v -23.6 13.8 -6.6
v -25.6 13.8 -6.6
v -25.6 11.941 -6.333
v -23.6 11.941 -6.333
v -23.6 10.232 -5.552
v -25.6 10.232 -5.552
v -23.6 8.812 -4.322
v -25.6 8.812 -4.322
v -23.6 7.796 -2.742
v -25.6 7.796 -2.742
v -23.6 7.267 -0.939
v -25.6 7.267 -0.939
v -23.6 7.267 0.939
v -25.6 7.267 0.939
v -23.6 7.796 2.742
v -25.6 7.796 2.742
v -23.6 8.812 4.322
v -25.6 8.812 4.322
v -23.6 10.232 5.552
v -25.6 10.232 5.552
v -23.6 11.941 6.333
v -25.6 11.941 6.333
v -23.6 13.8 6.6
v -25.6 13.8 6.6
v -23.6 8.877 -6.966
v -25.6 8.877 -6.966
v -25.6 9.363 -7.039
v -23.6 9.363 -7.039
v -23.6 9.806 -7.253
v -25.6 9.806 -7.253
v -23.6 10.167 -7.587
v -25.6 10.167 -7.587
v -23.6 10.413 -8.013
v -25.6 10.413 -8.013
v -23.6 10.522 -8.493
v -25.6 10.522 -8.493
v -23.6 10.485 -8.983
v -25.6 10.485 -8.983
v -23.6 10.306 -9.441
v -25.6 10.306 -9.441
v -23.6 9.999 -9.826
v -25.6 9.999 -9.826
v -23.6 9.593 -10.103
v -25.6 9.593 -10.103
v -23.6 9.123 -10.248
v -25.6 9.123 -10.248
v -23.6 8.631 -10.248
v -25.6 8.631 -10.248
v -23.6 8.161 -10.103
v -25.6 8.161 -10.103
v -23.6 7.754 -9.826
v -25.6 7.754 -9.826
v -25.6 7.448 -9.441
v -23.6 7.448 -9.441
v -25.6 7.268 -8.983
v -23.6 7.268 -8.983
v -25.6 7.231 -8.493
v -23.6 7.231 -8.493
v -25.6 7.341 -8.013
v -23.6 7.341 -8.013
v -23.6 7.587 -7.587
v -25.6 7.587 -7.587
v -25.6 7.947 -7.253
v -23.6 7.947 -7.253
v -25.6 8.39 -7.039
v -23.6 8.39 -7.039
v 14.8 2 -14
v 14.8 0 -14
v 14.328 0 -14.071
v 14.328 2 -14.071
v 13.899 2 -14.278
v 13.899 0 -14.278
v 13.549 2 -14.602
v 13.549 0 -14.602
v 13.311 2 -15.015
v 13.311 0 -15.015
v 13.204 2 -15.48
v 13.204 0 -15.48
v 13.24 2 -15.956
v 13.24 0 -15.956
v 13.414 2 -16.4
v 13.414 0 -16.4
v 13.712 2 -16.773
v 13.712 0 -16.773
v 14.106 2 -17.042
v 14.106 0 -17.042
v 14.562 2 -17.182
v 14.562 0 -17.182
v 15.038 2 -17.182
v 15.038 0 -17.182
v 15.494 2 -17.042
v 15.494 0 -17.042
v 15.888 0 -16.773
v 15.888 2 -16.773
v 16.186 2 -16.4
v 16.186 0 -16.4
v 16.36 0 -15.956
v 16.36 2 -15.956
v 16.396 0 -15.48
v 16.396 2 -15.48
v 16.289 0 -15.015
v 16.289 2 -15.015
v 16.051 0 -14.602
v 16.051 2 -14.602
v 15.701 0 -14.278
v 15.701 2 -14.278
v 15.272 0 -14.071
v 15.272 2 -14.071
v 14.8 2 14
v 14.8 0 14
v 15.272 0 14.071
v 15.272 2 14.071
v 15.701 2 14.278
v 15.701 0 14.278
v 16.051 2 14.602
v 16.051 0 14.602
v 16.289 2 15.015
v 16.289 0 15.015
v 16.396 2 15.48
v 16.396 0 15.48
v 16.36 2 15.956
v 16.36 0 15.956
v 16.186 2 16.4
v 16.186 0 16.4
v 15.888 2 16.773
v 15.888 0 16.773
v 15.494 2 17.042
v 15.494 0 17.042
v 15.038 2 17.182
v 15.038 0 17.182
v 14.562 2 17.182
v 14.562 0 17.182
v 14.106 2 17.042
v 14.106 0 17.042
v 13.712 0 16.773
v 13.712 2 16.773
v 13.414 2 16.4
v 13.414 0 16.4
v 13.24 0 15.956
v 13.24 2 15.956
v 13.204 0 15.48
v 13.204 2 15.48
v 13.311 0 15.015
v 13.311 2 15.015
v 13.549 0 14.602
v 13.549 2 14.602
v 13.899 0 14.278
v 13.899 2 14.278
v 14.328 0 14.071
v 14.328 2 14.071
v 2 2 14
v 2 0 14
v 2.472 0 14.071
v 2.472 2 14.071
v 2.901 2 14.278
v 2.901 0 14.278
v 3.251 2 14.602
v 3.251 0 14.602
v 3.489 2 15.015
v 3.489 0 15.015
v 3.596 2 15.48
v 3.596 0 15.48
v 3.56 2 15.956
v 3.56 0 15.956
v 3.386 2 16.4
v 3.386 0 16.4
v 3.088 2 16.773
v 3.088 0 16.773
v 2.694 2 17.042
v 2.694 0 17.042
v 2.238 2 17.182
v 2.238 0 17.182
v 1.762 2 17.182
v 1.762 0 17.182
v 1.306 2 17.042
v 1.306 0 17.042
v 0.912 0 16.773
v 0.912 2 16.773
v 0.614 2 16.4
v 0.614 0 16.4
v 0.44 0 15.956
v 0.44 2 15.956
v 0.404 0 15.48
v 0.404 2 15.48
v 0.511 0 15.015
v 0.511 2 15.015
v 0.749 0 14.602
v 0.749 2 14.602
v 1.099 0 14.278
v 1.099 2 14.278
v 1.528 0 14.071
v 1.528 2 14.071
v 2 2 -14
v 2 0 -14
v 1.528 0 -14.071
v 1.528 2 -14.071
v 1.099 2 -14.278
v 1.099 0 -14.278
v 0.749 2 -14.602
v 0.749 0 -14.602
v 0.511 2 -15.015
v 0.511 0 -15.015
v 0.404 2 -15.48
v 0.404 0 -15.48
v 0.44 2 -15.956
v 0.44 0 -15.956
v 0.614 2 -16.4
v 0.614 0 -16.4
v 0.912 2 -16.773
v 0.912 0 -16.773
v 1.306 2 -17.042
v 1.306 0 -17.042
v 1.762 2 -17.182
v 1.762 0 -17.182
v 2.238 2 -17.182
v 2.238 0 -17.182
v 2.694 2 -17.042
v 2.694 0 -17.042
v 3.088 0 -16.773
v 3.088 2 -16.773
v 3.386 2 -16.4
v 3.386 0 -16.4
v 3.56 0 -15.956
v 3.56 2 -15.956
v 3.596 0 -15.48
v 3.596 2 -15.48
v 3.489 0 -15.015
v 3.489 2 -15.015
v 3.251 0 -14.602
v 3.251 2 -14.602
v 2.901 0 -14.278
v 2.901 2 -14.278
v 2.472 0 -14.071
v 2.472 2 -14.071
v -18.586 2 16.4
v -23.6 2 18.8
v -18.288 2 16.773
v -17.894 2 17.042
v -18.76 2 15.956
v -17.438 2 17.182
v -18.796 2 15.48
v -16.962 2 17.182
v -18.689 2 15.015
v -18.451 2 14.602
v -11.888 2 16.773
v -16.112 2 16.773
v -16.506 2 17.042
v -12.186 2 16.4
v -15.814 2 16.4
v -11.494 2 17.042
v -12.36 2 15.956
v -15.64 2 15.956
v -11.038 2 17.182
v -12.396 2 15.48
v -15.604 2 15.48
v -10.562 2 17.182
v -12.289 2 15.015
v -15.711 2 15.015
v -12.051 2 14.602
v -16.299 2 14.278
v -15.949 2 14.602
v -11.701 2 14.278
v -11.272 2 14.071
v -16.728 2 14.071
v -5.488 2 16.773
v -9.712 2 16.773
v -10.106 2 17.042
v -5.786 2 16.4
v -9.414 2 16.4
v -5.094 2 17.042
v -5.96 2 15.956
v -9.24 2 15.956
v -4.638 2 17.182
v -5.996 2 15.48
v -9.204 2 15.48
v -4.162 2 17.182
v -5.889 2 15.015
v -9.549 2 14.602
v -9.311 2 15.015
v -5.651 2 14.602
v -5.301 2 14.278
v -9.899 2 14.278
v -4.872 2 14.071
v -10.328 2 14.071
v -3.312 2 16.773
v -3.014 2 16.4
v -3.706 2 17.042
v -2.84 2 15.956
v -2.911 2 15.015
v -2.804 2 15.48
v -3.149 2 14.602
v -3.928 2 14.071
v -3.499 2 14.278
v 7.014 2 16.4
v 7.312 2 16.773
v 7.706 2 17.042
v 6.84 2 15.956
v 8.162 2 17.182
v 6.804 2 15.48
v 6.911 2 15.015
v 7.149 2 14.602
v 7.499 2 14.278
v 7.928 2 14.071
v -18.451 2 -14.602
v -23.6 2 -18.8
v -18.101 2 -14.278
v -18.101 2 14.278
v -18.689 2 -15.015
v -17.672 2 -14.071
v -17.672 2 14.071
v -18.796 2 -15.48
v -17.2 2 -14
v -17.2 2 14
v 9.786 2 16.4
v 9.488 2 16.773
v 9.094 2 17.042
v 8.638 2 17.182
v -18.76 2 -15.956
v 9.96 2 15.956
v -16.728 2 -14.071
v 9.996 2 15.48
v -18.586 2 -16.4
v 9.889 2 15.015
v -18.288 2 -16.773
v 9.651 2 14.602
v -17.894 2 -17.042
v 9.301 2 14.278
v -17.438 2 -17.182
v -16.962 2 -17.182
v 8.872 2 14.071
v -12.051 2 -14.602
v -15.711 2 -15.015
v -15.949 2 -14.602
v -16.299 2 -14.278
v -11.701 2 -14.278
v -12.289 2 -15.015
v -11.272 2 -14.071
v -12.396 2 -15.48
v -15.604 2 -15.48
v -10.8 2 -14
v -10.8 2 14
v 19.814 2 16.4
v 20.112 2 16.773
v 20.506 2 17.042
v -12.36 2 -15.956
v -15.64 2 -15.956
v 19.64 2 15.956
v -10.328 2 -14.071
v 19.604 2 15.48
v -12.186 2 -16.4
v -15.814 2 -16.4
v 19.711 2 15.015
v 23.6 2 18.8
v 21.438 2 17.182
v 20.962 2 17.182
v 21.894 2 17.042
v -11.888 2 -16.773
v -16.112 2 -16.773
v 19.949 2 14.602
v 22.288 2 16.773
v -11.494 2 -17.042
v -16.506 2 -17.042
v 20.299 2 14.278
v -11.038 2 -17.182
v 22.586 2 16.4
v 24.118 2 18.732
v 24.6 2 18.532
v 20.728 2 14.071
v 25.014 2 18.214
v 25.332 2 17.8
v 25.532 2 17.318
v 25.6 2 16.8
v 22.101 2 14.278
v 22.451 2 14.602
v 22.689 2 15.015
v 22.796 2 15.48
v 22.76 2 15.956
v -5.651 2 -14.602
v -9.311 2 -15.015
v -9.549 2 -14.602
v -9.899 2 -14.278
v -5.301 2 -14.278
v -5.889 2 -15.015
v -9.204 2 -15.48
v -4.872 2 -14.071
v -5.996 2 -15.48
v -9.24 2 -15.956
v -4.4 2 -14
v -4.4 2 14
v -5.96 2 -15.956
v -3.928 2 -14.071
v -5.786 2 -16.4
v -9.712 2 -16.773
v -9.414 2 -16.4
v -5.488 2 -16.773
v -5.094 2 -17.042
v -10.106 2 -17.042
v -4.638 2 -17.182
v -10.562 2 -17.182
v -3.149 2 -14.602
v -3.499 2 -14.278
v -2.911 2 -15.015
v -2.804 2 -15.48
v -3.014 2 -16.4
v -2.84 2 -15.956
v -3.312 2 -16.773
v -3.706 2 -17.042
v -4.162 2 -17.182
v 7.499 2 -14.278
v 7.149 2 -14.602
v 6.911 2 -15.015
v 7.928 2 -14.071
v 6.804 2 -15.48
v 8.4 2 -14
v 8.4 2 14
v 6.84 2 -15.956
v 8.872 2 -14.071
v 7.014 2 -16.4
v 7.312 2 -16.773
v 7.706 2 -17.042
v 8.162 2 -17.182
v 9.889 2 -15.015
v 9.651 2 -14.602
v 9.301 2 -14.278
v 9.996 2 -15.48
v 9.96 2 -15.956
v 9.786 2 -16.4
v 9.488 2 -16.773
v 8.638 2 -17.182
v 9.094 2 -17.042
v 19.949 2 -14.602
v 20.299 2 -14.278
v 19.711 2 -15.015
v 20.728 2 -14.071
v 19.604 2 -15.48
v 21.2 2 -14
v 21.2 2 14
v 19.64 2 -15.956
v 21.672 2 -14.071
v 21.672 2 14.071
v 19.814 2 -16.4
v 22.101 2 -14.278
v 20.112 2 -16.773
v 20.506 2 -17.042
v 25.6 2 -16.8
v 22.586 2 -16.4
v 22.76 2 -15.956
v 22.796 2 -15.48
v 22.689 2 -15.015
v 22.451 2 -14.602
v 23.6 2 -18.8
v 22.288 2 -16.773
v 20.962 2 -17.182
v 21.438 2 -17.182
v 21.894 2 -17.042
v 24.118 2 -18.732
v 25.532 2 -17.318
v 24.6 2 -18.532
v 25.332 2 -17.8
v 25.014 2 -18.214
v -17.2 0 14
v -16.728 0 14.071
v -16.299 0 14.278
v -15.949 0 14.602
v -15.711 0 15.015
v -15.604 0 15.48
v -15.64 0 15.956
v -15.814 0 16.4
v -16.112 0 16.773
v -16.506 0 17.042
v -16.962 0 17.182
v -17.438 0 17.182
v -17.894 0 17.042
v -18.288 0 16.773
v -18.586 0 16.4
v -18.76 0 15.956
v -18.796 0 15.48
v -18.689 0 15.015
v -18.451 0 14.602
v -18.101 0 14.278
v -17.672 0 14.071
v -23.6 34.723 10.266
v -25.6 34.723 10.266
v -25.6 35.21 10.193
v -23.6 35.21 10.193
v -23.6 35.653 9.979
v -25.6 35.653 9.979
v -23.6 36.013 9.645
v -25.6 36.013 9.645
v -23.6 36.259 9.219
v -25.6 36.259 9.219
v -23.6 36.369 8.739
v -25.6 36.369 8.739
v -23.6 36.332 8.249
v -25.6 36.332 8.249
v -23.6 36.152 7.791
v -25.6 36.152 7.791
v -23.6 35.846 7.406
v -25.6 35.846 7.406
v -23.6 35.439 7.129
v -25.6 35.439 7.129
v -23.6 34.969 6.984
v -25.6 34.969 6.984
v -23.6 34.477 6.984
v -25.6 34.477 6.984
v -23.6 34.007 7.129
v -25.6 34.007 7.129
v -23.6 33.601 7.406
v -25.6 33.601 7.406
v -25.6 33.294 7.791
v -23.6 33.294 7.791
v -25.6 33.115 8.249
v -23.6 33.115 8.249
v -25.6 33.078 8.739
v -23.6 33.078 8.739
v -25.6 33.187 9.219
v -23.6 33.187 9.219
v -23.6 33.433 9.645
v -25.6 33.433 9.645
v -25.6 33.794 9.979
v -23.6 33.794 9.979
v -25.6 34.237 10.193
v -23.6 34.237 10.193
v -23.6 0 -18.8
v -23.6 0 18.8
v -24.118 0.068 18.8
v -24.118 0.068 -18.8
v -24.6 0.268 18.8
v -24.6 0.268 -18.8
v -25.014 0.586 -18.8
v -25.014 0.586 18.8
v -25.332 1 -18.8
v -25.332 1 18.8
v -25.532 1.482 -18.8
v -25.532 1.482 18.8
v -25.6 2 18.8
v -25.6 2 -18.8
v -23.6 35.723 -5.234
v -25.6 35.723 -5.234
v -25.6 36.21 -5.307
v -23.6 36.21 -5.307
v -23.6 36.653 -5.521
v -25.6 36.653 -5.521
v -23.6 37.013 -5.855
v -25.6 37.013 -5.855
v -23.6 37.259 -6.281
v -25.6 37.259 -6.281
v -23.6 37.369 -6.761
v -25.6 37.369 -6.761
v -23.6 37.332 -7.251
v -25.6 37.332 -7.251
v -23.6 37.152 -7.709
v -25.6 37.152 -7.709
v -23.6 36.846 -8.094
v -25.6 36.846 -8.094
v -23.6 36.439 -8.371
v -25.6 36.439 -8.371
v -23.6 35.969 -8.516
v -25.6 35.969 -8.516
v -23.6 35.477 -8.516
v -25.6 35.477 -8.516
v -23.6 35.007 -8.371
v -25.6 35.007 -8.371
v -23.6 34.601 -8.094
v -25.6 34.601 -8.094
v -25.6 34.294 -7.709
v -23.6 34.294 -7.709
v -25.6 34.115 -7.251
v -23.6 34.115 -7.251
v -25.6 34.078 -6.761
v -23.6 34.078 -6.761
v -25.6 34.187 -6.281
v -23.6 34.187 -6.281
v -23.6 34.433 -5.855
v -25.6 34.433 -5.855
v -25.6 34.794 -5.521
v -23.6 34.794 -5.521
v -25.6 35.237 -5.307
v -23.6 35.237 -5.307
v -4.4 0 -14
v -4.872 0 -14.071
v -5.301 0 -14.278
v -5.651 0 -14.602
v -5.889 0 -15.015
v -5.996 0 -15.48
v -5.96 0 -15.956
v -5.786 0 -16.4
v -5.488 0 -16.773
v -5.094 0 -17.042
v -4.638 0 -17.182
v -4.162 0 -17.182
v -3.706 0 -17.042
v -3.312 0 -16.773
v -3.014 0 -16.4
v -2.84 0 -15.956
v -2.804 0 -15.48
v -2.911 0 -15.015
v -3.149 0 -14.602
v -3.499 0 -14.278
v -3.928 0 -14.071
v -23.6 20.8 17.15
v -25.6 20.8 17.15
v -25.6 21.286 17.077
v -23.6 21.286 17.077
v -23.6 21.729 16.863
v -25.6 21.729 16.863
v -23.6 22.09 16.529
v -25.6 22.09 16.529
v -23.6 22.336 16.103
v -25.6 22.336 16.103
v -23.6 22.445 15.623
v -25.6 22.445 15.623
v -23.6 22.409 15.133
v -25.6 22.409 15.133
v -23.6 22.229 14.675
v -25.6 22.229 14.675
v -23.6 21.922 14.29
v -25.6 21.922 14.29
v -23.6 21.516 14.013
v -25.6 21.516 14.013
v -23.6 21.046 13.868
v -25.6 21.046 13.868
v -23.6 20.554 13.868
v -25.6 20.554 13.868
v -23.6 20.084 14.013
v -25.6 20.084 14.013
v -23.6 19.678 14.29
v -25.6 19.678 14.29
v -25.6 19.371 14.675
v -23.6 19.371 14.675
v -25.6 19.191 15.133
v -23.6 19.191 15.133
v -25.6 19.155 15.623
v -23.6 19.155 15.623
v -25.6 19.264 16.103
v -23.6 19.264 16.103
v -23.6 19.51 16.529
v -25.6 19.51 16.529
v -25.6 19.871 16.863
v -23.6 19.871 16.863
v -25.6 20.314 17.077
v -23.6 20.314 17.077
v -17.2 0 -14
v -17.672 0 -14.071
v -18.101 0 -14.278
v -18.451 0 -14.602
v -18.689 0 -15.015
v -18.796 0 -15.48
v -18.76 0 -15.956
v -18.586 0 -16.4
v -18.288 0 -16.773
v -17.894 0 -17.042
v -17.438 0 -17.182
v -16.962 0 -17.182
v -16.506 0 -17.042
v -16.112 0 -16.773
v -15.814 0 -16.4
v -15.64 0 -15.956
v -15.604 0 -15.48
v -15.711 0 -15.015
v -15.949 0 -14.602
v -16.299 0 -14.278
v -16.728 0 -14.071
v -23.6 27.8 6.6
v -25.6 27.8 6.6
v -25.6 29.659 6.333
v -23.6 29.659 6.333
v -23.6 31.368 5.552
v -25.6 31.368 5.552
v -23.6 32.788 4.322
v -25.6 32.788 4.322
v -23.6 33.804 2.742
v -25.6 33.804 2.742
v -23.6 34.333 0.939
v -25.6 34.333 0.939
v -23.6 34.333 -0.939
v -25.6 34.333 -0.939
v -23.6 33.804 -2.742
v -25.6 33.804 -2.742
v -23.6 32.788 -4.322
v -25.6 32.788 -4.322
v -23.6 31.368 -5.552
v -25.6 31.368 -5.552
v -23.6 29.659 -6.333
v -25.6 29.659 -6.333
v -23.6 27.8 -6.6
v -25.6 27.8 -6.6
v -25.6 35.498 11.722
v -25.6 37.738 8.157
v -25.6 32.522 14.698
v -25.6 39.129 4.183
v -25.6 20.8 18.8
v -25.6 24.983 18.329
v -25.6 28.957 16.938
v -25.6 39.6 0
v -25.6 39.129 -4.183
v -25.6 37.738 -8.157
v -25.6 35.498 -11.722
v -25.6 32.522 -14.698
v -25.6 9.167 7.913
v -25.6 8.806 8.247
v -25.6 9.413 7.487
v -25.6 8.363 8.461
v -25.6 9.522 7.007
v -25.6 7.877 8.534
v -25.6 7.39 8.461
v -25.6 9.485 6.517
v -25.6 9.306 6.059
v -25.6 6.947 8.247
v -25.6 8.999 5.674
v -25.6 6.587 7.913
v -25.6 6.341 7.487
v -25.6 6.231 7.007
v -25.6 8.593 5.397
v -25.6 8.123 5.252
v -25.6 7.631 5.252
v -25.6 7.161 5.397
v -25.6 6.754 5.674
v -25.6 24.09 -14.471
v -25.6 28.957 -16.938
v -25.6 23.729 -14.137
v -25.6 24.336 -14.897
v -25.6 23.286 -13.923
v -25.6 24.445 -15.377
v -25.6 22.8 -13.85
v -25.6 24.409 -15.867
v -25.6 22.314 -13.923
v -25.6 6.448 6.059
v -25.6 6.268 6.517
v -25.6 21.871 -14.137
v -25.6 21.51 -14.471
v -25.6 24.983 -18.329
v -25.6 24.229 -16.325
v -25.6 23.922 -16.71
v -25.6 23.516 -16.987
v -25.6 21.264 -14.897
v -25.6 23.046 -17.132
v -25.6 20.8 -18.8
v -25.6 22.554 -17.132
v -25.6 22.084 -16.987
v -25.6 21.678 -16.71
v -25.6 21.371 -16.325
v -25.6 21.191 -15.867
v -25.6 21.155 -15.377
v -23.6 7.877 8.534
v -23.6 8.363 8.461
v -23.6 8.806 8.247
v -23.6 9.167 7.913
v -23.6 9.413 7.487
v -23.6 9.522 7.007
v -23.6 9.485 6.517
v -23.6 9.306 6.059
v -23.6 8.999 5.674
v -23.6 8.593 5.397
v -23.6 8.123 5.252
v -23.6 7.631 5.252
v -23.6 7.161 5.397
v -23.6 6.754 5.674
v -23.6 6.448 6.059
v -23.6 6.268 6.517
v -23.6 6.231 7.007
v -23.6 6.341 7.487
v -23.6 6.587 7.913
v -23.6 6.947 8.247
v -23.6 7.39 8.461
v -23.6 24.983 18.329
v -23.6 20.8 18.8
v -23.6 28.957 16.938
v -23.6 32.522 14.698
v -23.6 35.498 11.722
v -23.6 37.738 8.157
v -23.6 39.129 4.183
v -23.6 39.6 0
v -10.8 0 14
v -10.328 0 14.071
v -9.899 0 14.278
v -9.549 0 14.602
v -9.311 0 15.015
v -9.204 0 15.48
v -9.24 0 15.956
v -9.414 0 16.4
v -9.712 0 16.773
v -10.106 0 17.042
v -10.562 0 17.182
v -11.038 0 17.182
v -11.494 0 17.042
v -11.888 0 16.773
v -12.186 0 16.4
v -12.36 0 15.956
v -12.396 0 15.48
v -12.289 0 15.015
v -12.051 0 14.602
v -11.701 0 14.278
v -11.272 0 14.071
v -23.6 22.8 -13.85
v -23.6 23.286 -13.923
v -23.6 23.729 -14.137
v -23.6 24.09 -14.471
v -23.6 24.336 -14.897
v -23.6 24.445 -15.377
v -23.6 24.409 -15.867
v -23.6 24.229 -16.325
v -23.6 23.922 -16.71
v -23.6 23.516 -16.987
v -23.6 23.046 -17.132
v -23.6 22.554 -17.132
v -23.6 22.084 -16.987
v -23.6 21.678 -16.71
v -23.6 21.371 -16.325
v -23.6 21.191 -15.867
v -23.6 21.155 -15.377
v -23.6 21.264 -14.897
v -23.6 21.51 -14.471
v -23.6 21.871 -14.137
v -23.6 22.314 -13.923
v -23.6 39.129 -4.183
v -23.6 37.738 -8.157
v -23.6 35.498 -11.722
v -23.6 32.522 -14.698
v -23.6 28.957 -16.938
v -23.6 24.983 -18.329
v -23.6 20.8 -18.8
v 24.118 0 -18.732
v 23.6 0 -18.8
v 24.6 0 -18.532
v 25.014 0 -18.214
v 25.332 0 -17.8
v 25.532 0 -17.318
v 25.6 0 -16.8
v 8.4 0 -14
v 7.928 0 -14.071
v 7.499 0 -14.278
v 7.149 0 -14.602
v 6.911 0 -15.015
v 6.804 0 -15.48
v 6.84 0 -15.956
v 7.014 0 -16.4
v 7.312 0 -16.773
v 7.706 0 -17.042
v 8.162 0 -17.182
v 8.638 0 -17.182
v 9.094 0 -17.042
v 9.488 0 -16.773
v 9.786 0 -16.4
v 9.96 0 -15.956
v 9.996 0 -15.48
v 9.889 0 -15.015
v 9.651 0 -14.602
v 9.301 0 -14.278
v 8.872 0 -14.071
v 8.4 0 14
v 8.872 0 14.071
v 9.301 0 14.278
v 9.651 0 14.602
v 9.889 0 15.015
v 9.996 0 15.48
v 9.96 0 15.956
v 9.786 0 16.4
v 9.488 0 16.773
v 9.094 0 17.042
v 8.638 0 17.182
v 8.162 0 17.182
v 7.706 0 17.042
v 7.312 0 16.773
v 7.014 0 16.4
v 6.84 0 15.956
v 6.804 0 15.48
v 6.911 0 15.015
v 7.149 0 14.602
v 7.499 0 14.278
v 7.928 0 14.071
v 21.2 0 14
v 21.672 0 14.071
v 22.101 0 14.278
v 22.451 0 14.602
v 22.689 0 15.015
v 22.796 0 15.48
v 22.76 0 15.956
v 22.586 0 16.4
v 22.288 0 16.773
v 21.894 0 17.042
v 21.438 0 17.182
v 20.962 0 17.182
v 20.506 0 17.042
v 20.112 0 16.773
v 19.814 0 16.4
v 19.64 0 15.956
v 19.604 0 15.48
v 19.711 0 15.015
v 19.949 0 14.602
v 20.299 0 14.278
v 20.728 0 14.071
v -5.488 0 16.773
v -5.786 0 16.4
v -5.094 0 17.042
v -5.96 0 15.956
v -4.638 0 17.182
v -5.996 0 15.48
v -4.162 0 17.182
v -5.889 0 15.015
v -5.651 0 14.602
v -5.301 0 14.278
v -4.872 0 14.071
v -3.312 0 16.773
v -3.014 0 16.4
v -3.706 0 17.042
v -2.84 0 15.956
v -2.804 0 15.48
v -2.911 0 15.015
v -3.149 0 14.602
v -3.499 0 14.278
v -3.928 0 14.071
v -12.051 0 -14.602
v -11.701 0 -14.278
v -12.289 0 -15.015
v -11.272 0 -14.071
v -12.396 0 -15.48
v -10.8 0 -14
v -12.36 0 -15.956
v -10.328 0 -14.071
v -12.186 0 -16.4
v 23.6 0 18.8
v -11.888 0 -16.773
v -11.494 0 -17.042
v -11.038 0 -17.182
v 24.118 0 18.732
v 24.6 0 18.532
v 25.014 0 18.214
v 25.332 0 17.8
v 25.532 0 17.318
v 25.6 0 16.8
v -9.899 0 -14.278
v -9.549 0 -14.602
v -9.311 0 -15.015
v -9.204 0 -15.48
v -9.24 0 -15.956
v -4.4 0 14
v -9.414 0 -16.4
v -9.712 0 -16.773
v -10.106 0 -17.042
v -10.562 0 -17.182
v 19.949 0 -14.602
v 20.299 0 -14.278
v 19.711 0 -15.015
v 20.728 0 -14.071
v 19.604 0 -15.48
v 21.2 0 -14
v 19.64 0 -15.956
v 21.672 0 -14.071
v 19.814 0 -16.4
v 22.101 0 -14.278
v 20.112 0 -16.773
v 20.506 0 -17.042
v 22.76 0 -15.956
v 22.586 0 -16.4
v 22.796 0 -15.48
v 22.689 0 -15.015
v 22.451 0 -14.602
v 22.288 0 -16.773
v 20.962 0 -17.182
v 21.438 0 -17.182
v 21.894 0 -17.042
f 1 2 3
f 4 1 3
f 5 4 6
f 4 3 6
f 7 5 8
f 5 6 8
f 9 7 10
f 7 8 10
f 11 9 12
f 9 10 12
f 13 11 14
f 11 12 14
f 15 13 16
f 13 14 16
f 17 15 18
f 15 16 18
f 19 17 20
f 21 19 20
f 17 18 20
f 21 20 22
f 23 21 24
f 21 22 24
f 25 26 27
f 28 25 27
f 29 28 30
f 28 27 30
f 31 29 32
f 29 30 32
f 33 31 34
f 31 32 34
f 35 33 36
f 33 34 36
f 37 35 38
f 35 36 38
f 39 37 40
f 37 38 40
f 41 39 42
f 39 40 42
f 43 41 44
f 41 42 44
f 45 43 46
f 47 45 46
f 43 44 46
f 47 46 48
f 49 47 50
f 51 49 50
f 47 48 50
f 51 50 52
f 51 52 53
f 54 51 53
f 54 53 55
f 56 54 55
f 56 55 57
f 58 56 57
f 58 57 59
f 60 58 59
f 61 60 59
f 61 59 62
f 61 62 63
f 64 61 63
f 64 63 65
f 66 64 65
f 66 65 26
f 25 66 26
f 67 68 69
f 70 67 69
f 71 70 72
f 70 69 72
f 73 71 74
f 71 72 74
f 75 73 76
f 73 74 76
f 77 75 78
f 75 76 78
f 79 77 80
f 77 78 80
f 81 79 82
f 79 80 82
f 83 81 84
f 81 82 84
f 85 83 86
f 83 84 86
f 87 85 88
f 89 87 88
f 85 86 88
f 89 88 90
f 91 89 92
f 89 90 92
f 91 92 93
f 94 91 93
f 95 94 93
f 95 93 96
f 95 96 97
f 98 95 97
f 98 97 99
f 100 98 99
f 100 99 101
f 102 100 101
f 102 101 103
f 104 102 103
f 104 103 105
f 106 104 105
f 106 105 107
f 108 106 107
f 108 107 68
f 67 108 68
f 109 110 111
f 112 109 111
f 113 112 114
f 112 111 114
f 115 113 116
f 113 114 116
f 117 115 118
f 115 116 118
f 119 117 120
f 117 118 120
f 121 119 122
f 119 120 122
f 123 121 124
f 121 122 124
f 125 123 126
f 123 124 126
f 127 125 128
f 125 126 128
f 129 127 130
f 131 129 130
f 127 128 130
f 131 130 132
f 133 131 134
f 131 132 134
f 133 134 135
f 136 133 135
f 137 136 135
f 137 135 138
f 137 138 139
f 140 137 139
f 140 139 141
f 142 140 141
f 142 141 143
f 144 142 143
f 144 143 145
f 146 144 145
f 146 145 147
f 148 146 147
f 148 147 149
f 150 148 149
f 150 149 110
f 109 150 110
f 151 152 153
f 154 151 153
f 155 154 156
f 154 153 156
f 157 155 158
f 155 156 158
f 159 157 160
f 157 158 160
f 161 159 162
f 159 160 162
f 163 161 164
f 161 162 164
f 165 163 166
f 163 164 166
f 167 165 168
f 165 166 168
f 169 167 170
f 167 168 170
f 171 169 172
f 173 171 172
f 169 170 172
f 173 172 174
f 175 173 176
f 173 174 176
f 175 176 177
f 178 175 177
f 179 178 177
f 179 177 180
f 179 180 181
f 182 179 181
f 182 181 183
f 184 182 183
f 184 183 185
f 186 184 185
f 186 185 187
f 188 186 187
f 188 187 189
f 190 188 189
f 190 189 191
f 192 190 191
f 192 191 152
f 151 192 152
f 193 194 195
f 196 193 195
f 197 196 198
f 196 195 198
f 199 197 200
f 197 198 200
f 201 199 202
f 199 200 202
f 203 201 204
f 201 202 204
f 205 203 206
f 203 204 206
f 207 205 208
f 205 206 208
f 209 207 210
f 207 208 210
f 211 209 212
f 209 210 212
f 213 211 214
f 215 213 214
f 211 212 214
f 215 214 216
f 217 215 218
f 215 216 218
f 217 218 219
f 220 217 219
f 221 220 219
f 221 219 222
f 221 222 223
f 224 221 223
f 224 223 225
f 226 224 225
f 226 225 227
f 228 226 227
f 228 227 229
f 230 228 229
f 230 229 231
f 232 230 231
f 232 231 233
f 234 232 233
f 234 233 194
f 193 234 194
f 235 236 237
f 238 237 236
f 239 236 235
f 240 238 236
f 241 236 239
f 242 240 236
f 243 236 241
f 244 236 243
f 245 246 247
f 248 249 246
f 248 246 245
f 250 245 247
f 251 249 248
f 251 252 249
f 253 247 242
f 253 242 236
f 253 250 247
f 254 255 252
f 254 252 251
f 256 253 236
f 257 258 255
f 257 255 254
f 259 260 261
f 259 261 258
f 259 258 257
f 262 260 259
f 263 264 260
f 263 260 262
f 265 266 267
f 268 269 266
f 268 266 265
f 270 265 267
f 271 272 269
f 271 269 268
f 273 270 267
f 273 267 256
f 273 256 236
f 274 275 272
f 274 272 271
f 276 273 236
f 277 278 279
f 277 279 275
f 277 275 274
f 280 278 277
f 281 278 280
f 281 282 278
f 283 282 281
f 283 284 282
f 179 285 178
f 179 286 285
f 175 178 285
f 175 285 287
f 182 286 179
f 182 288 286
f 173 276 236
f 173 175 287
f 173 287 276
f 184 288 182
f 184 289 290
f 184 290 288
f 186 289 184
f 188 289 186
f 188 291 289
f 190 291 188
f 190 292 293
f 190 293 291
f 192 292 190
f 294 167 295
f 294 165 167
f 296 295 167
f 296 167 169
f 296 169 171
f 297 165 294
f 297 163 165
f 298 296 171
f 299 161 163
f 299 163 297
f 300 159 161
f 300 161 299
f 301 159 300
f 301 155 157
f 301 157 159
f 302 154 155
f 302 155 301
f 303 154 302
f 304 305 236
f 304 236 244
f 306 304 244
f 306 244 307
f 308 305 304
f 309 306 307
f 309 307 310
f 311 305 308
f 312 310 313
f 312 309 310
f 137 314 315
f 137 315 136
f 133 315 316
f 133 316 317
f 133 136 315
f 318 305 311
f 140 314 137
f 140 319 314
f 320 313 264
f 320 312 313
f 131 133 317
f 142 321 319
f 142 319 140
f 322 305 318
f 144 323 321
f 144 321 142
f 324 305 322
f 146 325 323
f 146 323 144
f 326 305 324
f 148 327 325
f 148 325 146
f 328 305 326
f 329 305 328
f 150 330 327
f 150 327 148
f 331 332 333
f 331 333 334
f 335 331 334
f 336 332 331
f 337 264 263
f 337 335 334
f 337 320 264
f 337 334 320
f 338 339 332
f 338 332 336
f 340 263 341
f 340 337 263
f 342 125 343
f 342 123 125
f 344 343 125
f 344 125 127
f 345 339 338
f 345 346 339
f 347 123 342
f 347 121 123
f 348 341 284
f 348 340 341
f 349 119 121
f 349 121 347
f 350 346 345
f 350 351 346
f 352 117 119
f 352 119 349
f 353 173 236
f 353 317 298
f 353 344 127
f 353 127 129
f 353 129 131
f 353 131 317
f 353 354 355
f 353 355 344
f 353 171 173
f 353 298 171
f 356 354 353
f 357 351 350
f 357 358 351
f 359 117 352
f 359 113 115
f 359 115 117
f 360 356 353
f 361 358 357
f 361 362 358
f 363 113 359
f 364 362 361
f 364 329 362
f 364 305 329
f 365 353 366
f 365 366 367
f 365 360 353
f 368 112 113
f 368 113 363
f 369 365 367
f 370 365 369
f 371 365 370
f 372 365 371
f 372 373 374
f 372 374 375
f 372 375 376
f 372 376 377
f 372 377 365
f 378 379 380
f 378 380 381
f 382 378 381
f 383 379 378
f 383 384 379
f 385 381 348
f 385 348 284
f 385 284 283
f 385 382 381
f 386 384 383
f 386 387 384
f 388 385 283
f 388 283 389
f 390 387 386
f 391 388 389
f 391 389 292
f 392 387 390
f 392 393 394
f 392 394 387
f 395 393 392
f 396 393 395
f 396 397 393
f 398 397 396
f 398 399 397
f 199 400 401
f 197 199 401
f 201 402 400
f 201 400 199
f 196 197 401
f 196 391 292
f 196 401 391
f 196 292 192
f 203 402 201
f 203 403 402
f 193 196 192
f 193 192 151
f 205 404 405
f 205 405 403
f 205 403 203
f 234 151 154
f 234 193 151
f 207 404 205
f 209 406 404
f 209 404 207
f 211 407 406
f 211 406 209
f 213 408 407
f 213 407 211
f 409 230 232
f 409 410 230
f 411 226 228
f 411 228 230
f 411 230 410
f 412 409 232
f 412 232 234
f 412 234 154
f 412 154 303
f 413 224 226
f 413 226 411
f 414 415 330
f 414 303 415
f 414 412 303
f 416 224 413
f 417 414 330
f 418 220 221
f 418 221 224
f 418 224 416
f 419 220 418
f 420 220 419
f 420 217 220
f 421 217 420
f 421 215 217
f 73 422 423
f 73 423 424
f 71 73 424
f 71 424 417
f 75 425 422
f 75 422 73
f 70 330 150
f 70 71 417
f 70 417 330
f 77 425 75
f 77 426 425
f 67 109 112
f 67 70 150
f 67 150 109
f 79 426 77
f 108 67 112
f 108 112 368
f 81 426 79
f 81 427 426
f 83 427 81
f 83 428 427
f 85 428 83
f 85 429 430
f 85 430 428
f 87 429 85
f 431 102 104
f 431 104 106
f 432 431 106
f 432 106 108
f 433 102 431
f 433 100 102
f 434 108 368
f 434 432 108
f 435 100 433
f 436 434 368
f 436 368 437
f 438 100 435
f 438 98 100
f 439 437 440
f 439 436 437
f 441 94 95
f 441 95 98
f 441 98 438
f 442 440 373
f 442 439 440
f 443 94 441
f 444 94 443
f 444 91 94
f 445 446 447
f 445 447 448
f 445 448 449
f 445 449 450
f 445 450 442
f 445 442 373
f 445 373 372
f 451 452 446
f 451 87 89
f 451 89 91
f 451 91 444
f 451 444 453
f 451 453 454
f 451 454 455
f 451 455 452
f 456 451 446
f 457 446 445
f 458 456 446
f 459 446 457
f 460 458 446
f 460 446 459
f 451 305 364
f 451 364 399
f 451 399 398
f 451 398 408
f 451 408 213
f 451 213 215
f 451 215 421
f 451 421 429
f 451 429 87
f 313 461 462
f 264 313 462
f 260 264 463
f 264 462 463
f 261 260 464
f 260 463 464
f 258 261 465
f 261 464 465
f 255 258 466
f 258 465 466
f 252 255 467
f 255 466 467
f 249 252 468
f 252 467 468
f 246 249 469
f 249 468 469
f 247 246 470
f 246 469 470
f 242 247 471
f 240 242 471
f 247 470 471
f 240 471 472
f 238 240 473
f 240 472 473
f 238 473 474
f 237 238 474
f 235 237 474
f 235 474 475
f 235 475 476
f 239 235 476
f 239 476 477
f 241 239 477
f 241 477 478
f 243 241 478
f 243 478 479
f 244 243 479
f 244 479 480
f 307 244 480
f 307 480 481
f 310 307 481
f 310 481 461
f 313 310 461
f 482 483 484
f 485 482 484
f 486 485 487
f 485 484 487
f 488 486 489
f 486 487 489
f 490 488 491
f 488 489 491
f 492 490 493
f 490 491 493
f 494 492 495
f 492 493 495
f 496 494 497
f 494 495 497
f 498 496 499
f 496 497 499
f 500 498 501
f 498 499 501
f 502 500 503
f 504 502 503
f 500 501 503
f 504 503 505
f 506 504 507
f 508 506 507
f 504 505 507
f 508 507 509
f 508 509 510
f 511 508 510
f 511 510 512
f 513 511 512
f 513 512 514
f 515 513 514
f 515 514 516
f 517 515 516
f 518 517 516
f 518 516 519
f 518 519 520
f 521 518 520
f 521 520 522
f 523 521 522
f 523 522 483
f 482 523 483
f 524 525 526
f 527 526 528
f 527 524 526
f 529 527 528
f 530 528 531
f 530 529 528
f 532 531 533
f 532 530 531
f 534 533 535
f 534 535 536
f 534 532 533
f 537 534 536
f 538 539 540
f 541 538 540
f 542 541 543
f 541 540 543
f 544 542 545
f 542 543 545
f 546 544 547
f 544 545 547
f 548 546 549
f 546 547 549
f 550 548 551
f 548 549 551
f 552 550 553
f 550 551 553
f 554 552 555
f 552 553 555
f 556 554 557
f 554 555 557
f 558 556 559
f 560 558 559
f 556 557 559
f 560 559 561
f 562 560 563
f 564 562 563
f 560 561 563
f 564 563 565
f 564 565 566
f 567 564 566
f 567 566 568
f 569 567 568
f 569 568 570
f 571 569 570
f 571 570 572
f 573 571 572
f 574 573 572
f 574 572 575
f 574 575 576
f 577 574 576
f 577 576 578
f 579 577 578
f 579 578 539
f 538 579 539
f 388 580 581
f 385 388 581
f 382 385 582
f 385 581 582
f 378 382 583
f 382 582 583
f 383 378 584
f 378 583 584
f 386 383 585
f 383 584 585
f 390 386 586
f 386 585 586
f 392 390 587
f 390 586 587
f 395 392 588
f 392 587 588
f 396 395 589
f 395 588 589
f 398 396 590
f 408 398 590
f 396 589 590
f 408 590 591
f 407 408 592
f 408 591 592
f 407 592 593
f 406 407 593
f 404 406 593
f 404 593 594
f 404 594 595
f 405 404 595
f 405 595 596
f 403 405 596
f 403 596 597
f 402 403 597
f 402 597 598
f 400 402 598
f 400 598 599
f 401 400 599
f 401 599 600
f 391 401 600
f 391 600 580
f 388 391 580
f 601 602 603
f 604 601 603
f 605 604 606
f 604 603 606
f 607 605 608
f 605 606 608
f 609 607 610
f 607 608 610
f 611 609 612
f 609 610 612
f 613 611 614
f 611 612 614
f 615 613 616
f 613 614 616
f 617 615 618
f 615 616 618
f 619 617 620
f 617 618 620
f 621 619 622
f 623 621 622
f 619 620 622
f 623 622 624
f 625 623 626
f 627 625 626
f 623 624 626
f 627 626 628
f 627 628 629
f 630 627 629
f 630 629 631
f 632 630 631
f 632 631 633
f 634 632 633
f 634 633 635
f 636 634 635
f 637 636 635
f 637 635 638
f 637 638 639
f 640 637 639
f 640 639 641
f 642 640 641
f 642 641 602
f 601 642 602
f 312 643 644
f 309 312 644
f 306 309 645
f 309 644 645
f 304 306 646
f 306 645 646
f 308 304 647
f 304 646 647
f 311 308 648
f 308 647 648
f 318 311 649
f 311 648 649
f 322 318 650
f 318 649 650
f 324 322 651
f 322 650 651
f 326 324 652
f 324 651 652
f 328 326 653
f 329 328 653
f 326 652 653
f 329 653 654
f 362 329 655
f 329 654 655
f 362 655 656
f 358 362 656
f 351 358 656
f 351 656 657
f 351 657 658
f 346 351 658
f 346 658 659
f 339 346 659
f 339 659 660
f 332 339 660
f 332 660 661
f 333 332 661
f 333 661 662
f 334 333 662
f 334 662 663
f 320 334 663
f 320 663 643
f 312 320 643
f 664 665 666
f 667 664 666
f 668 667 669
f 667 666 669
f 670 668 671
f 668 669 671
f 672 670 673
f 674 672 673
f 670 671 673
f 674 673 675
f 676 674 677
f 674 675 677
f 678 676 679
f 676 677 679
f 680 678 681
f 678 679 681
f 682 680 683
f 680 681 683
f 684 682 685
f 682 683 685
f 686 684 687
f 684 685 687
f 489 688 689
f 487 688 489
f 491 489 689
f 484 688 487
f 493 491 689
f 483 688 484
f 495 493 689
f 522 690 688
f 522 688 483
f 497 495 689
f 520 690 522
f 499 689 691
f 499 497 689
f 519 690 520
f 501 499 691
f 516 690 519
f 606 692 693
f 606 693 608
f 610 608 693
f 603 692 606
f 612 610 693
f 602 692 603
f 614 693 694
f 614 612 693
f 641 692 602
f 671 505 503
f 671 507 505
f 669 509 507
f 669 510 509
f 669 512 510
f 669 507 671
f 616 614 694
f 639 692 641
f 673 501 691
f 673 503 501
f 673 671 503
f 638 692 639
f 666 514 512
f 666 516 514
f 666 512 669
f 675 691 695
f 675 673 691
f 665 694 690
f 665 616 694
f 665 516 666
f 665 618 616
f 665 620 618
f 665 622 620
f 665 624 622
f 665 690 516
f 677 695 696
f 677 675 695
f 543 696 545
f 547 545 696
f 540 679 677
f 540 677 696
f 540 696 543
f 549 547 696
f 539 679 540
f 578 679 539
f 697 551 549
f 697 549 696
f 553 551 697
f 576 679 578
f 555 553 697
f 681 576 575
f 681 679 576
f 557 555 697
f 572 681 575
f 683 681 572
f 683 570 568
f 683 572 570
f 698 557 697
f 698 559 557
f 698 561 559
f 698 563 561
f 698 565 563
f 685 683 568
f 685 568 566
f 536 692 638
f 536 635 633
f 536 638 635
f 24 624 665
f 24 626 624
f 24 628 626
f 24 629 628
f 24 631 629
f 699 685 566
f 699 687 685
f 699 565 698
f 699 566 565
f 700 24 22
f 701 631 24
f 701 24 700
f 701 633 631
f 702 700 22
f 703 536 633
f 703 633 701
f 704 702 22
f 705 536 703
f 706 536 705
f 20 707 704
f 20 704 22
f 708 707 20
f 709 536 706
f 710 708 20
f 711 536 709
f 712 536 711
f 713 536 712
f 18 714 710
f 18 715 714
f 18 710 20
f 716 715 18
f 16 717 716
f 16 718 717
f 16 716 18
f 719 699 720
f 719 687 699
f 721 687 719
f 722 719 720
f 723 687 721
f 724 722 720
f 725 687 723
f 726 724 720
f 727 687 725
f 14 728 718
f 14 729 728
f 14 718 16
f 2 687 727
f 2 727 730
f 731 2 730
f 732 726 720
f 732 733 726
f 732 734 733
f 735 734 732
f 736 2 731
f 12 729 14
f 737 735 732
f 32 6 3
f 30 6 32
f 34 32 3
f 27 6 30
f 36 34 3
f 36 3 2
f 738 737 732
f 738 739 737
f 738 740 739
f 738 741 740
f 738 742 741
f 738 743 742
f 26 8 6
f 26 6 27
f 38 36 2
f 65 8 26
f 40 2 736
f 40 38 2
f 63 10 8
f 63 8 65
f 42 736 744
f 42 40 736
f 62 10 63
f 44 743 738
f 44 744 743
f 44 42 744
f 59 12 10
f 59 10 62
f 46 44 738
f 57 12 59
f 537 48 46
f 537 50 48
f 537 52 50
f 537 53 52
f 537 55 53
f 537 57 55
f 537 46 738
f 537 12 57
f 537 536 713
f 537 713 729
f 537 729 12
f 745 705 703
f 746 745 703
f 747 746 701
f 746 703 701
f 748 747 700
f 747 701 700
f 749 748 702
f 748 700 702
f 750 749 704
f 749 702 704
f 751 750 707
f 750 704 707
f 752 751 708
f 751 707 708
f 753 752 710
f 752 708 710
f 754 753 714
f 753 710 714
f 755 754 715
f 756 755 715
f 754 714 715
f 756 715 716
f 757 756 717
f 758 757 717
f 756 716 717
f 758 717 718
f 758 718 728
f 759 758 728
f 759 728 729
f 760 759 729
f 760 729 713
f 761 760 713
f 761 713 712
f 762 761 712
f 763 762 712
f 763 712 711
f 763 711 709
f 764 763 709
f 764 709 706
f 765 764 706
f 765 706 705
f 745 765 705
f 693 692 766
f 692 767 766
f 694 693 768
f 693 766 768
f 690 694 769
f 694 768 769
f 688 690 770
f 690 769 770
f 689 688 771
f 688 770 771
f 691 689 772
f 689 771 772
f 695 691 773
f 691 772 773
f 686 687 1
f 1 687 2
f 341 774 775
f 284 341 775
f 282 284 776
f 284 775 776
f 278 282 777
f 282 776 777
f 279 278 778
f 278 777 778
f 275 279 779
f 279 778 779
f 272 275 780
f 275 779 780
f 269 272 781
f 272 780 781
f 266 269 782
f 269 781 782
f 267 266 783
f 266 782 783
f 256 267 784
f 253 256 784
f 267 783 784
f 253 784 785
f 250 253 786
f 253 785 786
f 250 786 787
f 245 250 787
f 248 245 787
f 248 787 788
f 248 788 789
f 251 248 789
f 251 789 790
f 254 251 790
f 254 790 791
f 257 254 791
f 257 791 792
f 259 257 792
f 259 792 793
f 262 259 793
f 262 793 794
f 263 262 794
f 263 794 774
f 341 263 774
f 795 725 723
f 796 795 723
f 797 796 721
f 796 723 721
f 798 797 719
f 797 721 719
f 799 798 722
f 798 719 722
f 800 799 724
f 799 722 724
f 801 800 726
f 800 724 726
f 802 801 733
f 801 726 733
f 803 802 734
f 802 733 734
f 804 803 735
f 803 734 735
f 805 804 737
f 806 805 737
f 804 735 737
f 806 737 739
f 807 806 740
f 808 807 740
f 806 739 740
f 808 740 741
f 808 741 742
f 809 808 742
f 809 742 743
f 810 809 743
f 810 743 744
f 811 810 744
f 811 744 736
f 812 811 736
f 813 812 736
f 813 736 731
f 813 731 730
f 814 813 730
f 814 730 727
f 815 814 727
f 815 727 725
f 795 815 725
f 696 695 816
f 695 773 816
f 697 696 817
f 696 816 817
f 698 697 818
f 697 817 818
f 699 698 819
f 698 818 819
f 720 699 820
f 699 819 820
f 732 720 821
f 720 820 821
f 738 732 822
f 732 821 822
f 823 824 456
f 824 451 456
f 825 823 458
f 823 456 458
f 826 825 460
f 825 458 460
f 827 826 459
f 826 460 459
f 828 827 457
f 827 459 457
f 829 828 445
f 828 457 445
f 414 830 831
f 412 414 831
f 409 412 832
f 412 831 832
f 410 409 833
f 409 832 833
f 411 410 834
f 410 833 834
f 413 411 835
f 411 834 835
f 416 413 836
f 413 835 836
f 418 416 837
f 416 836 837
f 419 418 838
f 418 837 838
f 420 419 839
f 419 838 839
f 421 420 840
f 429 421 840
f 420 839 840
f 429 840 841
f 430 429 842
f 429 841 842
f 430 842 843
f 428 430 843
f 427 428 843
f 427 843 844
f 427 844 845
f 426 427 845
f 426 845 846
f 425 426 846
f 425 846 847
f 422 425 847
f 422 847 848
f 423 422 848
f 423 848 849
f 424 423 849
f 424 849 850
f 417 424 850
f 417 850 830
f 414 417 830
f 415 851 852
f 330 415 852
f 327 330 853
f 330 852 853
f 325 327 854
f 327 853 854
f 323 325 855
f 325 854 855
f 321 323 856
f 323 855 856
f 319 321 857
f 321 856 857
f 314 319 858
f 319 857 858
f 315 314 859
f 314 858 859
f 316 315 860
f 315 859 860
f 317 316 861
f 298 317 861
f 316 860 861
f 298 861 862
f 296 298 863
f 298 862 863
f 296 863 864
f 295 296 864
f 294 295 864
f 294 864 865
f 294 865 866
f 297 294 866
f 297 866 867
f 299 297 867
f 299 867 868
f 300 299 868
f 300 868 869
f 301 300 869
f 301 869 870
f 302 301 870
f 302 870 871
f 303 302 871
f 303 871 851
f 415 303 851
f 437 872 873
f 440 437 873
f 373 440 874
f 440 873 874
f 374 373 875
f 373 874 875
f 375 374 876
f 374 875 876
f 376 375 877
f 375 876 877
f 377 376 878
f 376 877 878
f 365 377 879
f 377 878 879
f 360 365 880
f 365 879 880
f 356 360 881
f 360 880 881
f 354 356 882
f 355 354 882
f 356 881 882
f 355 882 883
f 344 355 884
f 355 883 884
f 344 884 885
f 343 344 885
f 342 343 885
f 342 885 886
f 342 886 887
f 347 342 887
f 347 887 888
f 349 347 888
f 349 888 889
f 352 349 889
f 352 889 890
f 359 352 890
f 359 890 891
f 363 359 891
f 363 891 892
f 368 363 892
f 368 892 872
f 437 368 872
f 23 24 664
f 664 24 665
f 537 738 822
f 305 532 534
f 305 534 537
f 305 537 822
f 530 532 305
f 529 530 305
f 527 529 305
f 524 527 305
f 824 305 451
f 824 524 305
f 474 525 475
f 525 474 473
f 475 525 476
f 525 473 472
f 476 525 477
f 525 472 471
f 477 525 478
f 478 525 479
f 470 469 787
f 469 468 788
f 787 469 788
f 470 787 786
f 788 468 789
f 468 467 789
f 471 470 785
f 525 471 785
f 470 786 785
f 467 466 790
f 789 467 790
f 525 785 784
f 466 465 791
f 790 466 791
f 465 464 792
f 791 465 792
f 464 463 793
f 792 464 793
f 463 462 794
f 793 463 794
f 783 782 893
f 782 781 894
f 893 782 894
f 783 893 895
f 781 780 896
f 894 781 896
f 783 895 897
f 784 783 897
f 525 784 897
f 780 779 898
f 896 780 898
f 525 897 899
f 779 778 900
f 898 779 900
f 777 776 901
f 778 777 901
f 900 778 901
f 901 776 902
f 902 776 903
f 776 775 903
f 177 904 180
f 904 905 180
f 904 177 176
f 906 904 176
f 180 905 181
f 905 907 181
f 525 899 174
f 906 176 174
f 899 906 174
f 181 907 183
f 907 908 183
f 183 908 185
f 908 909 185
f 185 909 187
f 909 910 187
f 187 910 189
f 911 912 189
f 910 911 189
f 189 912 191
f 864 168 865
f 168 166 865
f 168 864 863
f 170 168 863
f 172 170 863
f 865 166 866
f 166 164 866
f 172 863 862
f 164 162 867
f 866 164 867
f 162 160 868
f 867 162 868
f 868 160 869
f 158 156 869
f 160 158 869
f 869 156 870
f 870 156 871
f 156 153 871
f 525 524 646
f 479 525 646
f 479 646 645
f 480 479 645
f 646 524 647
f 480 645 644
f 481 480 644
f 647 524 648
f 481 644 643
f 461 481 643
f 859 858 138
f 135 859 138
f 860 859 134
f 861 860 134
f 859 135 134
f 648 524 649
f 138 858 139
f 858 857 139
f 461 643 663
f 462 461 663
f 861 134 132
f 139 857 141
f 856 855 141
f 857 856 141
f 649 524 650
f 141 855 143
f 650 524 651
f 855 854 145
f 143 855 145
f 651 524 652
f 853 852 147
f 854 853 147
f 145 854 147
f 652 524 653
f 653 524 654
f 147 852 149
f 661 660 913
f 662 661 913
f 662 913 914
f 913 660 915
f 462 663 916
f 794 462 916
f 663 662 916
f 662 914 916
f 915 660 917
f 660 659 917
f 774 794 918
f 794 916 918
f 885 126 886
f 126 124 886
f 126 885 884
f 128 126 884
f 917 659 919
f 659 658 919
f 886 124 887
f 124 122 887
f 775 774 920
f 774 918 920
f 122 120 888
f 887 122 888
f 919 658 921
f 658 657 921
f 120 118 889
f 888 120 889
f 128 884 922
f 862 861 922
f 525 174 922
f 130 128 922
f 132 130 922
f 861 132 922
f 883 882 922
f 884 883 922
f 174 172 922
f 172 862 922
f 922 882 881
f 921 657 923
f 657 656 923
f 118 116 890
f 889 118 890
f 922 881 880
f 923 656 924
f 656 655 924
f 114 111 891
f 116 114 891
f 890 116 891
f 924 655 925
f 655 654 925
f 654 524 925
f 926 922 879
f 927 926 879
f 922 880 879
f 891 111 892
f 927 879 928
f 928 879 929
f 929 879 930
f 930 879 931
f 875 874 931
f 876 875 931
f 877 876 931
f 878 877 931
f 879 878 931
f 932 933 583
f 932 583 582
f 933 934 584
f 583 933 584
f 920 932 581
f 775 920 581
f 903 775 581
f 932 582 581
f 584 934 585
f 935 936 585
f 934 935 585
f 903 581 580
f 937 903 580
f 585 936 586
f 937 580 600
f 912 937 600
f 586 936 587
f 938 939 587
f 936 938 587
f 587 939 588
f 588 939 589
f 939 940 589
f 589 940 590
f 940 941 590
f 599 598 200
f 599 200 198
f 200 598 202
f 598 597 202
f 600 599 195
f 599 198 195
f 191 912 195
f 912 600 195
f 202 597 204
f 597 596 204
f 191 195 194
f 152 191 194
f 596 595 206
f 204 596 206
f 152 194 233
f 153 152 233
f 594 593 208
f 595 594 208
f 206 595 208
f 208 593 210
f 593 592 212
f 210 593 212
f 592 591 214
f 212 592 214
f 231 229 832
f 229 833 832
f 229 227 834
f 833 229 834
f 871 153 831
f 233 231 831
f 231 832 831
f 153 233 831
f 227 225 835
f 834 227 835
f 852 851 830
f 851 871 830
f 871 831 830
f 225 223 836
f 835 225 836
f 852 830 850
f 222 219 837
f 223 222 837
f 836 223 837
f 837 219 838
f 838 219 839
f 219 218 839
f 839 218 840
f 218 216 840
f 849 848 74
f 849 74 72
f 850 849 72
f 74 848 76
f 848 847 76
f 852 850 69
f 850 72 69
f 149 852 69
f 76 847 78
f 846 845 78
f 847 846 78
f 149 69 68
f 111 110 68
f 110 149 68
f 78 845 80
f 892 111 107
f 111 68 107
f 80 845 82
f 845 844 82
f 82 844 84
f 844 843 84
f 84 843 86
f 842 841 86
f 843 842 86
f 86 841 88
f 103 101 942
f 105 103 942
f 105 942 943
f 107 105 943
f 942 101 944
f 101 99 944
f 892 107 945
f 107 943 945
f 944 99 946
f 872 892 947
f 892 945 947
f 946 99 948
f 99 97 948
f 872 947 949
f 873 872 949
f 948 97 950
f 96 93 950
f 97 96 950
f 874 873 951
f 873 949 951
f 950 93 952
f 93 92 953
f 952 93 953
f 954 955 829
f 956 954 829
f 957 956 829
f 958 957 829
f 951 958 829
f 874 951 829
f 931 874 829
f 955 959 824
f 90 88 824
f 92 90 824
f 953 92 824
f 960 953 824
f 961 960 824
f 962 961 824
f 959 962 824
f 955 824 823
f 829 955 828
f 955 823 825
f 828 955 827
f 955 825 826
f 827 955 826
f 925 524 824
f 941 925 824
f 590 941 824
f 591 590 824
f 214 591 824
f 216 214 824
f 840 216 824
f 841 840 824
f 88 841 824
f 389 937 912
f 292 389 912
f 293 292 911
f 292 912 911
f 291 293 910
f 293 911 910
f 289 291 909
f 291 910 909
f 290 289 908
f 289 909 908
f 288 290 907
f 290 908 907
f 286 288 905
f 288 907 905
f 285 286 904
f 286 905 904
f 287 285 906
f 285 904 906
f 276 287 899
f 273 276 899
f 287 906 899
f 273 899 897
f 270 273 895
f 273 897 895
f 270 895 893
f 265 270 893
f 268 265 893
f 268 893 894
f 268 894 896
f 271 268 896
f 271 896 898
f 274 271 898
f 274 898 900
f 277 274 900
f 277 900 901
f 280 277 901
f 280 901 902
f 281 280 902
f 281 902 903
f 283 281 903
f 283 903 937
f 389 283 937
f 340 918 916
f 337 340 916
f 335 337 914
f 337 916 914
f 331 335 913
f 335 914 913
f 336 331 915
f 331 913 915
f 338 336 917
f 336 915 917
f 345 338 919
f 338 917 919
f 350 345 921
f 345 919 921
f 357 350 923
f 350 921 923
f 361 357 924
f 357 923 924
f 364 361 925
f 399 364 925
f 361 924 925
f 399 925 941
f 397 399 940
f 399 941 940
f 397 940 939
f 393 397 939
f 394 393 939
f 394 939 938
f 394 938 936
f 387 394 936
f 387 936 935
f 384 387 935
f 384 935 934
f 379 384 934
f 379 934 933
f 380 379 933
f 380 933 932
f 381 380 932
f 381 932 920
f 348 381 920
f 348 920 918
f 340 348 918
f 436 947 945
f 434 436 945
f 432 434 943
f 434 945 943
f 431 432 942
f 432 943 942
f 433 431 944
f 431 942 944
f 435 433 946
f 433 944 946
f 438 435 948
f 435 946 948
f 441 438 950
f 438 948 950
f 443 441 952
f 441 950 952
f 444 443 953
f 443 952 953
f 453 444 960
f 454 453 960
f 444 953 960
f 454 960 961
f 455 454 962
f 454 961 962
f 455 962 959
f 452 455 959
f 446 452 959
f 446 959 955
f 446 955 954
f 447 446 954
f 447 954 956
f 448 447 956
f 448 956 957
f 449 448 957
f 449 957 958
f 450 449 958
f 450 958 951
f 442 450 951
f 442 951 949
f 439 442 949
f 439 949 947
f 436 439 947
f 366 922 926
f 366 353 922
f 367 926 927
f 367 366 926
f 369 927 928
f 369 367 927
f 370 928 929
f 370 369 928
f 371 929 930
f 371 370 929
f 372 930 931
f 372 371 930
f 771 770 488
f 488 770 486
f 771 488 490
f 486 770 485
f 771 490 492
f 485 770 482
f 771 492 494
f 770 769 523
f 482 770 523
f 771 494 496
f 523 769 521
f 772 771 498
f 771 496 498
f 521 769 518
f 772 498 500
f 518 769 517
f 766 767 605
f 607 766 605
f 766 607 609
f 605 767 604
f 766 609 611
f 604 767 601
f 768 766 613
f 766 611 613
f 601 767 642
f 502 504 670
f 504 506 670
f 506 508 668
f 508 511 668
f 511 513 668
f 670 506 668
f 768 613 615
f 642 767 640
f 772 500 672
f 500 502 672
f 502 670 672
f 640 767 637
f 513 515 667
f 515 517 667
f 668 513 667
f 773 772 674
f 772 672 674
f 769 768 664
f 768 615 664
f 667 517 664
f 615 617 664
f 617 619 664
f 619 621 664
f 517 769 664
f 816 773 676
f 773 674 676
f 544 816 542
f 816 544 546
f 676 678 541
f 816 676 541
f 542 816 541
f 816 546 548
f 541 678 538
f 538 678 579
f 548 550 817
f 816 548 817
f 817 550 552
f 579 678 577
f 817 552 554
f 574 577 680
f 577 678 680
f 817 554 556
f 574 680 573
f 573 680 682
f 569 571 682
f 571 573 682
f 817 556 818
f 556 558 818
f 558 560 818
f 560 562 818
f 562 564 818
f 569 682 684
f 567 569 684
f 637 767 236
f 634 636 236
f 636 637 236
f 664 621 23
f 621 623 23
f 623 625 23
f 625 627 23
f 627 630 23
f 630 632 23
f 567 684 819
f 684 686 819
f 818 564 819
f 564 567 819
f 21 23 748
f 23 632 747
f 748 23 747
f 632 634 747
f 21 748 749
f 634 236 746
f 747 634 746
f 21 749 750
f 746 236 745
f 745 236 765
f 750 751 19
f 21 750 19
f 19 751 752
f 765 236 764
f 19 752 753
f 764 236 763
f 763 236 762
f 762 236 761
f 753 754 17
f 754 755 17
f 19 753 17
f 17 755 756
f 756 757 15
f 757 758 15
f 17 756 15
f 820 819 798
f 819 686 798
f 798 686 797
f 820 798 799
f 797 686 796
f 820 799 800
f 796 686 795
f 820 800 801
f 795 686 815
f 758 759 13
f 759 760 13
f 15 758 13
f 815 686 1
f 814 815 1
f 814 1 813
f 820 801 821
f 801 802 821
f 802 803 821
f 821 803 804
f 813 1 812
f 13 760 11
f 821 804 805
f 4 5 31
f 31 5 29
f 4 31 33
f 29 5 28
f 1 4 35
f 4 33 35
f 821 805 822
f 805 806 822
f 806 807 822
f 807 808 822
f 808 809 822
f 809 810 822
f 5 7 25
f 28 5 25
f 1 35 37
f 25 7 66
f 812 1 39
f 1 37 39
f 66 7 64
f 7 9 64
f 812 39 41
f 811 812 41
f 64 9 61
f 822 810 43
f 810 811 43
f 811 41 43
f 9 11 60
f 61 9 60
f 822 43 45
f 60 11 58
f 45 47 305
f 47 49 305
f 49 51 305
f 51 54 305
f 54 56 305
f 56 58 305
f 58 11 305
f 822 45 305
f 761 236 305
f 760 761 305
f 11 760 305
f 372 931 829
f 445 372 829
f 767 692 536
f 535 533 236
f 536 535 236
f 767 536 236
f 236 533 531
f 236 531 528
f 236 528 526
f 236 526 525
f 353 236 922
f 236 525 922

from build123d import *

# Parameters (mm, degrees)
SKETCH1_W           = 51.2
SKETCH1_H           = 37.6
BOSS_EXTRUDE1_DEPTH = 2
SKETCH2_W           = 2
SKETCH2_H           = 37.6
BOSS_EXTRUDE2_DEPTH = 37.6
SKETCH3_R           = 1.65
CUT_EXTRUDE2_DEPTH  = 37.6
SKETCH5_R           = 6.6
CUT_EXTRUDE3_DEPTH  = 37.6
SKETCH6_R           = 1.6
CUT_EXTRUDE4_DEPTH  = 37.6
FILLET1_R           = 2
FILLET2_R           = 2
FILLET3_R           = 18.8


with BuildPart() as part:
    # Sketch1 → Boss-Extrude1 (new body)
    with BuildSketch(Plane(origin=(0, 0, 0), x_dir=(1, 0, 0), z_dir=(0, 1, 0))):
        Rectangle(SKETCH1_W, SKETCH1_H)
    extrude(amount=BOSS_EXTRUDE1_DEPTH)

    # Sketch2 → Boss-Extrude2 (add)
    with BuildSketch(Plane(origin=(0, 2, 0), x_dir=(1, 0, 0), z_dir=(0, 1, 0))):
        with Locations((-24.6, 0)):
            Rectangle(SKETCH2_W, SKETCH2_H)
    extrude(amount=BOSS_EXTRUDE2_DEPTH)

    # Sketch3 → Cut-Extrude2 (cut)
    with BuildSketch(Plane.ZY.offset(25.6)):
        with Locations((15.5, 20.8)):
            Circle(SKETCH3_R)
        with Locations((6.883974596, 7.876606241)):
            Circle(SKETCH3_R)
        with Locations((-8.616025404, 8.876606241)):
            Circle(SKETCH3_R)
        with Locations((-15.5, 22.8)):
            Circle(SKETCH3_R)
        with Locations((-6.883974596, 35.723393759)):
            Circle(SKETCH3_R)
        with Locations((8.616025404, 34.723393759)):
            Circle(SKETCH3_R)
    extrude(amount=-CUT_EXTRUDE2_DEPTH, mode=Mode.SUBTRACT)

    # Sketch5 → Cut-Extrude3 (cut)
    with BuildSketch(Plane.ZY.offset(25.6)):
        with Locations((0, 27.8)):
            Circle(SKETCH5_R)
        with BuildLine():
            Line((6.6, 13.8), (6.6, 27.8))
            ThreePointArc((6.6, 27.8), (0, 21.2), (-6.6, 27.8))
            Line((-6.6, 27.8), (-6.6, 13.8))
            ThreePointArc((-6.6, 13.8), (0, 20.4), (6.6, 13.8))
        make_face()
        with Locations((0, 13.8)):
            Circle(SKETCH5_R)
    extrude(amount=-CUT_EXTRUDE3_DEPTH, mode=Mode.SUBTRACT)

    # Sketch6 → Cut-Extrude4 (cut)
    with BuildSketch(Plane(origin=(0, 0, 0), x_dir=(-1, 0, 0), z_dir=(0, -1, 0))):
        with Locations(Location((17.2, -15.6, 0), (0, 0, 90))):
            Circle(SKETCH6_R)
        with Locations(Location((10.8, -15.6, 0), (0, 0, 90))):
            Circle(SKETCH6_R)
        with Locations(Location((4.4, -15.6, 0), (0, 0, 90))):
            Circle(SKETCH6_R)
        with Locations(Location((-2, -15.6, 0), (0, 0, 90))):
            Circle(SKETCH6_R)
        with Locations(Location((-8.4, -15.6, 0), (0, 0, 90))):
            Circle(SKETCH6_R)
        with Locations(Location((-14.8, -15.6, 0), (0, 0, 90))):
            Circle(SKETCH6_R)
        with Locations(Location((-21.2, -15.6, 0), (0, 0, 90))):
            Circle(SKETCH6_R)
        with Locations(Location((-21.2, 15.6, 0), (0, 0, 270))):
            Circle(SKETCH6_R)
        with Locations(Location((-14.8, 15.6, 0), (0, 0, 270))):
            Circle(SKETCH6_R)
        with Locations(Location((-8.4, 15.6, 0), (0, 0, 270))):
            Circle(SKETCH6_R)
        with Locations(Location((-2, 15.6, 0), (0, 0, 270))):
            Circle(SKETCH6_R)
        with Locations(Location((4.4, 15.6, 0), (0, 0, 270))):
            Circle(SKETCH6_R)
        with Locations(Location((10.8, 15.6, 0), (0, 0, 270))):
            Circle(SKETCH6_R)
        with Locations(Location((17.2, 15.6, 0), (0, 0, 270))):
            Circle(SKETCH6_R)
    extrude(amount=-CUT_EXTRUDE4_DEPTH, mode=Mode.SUBTRACT)

    # Fillet1
    fillet1_edges = [part.edges().sort_by_distance(p)[0] for p in [
        (25.6, 1, -18.8),
        (25.6, 1, 18.8),
    ]]
    fillet(fillet1_edges, radius=FILLET1_R)

    # Fillet2
    fillet2_edges = [part.edges().sort_by_distance(p)[0] for p in [
        (-25.6, 0, 0),
    ]]
    fillet(fillet2_edges, radius=FILLET2_R)

    # Fillet3
    fillet3_edges = [part.edges().sort_by_distance(p)[0] for p in [
        (-24.6, 39.6, -18.8),
        (-24.6, 39.6, 18.8),
    ]]
    fillet(fillet3_edges, radius=FILLET3_R - 0.0001)  # a hair under: the kernel refuses the full size


solid = part.part
